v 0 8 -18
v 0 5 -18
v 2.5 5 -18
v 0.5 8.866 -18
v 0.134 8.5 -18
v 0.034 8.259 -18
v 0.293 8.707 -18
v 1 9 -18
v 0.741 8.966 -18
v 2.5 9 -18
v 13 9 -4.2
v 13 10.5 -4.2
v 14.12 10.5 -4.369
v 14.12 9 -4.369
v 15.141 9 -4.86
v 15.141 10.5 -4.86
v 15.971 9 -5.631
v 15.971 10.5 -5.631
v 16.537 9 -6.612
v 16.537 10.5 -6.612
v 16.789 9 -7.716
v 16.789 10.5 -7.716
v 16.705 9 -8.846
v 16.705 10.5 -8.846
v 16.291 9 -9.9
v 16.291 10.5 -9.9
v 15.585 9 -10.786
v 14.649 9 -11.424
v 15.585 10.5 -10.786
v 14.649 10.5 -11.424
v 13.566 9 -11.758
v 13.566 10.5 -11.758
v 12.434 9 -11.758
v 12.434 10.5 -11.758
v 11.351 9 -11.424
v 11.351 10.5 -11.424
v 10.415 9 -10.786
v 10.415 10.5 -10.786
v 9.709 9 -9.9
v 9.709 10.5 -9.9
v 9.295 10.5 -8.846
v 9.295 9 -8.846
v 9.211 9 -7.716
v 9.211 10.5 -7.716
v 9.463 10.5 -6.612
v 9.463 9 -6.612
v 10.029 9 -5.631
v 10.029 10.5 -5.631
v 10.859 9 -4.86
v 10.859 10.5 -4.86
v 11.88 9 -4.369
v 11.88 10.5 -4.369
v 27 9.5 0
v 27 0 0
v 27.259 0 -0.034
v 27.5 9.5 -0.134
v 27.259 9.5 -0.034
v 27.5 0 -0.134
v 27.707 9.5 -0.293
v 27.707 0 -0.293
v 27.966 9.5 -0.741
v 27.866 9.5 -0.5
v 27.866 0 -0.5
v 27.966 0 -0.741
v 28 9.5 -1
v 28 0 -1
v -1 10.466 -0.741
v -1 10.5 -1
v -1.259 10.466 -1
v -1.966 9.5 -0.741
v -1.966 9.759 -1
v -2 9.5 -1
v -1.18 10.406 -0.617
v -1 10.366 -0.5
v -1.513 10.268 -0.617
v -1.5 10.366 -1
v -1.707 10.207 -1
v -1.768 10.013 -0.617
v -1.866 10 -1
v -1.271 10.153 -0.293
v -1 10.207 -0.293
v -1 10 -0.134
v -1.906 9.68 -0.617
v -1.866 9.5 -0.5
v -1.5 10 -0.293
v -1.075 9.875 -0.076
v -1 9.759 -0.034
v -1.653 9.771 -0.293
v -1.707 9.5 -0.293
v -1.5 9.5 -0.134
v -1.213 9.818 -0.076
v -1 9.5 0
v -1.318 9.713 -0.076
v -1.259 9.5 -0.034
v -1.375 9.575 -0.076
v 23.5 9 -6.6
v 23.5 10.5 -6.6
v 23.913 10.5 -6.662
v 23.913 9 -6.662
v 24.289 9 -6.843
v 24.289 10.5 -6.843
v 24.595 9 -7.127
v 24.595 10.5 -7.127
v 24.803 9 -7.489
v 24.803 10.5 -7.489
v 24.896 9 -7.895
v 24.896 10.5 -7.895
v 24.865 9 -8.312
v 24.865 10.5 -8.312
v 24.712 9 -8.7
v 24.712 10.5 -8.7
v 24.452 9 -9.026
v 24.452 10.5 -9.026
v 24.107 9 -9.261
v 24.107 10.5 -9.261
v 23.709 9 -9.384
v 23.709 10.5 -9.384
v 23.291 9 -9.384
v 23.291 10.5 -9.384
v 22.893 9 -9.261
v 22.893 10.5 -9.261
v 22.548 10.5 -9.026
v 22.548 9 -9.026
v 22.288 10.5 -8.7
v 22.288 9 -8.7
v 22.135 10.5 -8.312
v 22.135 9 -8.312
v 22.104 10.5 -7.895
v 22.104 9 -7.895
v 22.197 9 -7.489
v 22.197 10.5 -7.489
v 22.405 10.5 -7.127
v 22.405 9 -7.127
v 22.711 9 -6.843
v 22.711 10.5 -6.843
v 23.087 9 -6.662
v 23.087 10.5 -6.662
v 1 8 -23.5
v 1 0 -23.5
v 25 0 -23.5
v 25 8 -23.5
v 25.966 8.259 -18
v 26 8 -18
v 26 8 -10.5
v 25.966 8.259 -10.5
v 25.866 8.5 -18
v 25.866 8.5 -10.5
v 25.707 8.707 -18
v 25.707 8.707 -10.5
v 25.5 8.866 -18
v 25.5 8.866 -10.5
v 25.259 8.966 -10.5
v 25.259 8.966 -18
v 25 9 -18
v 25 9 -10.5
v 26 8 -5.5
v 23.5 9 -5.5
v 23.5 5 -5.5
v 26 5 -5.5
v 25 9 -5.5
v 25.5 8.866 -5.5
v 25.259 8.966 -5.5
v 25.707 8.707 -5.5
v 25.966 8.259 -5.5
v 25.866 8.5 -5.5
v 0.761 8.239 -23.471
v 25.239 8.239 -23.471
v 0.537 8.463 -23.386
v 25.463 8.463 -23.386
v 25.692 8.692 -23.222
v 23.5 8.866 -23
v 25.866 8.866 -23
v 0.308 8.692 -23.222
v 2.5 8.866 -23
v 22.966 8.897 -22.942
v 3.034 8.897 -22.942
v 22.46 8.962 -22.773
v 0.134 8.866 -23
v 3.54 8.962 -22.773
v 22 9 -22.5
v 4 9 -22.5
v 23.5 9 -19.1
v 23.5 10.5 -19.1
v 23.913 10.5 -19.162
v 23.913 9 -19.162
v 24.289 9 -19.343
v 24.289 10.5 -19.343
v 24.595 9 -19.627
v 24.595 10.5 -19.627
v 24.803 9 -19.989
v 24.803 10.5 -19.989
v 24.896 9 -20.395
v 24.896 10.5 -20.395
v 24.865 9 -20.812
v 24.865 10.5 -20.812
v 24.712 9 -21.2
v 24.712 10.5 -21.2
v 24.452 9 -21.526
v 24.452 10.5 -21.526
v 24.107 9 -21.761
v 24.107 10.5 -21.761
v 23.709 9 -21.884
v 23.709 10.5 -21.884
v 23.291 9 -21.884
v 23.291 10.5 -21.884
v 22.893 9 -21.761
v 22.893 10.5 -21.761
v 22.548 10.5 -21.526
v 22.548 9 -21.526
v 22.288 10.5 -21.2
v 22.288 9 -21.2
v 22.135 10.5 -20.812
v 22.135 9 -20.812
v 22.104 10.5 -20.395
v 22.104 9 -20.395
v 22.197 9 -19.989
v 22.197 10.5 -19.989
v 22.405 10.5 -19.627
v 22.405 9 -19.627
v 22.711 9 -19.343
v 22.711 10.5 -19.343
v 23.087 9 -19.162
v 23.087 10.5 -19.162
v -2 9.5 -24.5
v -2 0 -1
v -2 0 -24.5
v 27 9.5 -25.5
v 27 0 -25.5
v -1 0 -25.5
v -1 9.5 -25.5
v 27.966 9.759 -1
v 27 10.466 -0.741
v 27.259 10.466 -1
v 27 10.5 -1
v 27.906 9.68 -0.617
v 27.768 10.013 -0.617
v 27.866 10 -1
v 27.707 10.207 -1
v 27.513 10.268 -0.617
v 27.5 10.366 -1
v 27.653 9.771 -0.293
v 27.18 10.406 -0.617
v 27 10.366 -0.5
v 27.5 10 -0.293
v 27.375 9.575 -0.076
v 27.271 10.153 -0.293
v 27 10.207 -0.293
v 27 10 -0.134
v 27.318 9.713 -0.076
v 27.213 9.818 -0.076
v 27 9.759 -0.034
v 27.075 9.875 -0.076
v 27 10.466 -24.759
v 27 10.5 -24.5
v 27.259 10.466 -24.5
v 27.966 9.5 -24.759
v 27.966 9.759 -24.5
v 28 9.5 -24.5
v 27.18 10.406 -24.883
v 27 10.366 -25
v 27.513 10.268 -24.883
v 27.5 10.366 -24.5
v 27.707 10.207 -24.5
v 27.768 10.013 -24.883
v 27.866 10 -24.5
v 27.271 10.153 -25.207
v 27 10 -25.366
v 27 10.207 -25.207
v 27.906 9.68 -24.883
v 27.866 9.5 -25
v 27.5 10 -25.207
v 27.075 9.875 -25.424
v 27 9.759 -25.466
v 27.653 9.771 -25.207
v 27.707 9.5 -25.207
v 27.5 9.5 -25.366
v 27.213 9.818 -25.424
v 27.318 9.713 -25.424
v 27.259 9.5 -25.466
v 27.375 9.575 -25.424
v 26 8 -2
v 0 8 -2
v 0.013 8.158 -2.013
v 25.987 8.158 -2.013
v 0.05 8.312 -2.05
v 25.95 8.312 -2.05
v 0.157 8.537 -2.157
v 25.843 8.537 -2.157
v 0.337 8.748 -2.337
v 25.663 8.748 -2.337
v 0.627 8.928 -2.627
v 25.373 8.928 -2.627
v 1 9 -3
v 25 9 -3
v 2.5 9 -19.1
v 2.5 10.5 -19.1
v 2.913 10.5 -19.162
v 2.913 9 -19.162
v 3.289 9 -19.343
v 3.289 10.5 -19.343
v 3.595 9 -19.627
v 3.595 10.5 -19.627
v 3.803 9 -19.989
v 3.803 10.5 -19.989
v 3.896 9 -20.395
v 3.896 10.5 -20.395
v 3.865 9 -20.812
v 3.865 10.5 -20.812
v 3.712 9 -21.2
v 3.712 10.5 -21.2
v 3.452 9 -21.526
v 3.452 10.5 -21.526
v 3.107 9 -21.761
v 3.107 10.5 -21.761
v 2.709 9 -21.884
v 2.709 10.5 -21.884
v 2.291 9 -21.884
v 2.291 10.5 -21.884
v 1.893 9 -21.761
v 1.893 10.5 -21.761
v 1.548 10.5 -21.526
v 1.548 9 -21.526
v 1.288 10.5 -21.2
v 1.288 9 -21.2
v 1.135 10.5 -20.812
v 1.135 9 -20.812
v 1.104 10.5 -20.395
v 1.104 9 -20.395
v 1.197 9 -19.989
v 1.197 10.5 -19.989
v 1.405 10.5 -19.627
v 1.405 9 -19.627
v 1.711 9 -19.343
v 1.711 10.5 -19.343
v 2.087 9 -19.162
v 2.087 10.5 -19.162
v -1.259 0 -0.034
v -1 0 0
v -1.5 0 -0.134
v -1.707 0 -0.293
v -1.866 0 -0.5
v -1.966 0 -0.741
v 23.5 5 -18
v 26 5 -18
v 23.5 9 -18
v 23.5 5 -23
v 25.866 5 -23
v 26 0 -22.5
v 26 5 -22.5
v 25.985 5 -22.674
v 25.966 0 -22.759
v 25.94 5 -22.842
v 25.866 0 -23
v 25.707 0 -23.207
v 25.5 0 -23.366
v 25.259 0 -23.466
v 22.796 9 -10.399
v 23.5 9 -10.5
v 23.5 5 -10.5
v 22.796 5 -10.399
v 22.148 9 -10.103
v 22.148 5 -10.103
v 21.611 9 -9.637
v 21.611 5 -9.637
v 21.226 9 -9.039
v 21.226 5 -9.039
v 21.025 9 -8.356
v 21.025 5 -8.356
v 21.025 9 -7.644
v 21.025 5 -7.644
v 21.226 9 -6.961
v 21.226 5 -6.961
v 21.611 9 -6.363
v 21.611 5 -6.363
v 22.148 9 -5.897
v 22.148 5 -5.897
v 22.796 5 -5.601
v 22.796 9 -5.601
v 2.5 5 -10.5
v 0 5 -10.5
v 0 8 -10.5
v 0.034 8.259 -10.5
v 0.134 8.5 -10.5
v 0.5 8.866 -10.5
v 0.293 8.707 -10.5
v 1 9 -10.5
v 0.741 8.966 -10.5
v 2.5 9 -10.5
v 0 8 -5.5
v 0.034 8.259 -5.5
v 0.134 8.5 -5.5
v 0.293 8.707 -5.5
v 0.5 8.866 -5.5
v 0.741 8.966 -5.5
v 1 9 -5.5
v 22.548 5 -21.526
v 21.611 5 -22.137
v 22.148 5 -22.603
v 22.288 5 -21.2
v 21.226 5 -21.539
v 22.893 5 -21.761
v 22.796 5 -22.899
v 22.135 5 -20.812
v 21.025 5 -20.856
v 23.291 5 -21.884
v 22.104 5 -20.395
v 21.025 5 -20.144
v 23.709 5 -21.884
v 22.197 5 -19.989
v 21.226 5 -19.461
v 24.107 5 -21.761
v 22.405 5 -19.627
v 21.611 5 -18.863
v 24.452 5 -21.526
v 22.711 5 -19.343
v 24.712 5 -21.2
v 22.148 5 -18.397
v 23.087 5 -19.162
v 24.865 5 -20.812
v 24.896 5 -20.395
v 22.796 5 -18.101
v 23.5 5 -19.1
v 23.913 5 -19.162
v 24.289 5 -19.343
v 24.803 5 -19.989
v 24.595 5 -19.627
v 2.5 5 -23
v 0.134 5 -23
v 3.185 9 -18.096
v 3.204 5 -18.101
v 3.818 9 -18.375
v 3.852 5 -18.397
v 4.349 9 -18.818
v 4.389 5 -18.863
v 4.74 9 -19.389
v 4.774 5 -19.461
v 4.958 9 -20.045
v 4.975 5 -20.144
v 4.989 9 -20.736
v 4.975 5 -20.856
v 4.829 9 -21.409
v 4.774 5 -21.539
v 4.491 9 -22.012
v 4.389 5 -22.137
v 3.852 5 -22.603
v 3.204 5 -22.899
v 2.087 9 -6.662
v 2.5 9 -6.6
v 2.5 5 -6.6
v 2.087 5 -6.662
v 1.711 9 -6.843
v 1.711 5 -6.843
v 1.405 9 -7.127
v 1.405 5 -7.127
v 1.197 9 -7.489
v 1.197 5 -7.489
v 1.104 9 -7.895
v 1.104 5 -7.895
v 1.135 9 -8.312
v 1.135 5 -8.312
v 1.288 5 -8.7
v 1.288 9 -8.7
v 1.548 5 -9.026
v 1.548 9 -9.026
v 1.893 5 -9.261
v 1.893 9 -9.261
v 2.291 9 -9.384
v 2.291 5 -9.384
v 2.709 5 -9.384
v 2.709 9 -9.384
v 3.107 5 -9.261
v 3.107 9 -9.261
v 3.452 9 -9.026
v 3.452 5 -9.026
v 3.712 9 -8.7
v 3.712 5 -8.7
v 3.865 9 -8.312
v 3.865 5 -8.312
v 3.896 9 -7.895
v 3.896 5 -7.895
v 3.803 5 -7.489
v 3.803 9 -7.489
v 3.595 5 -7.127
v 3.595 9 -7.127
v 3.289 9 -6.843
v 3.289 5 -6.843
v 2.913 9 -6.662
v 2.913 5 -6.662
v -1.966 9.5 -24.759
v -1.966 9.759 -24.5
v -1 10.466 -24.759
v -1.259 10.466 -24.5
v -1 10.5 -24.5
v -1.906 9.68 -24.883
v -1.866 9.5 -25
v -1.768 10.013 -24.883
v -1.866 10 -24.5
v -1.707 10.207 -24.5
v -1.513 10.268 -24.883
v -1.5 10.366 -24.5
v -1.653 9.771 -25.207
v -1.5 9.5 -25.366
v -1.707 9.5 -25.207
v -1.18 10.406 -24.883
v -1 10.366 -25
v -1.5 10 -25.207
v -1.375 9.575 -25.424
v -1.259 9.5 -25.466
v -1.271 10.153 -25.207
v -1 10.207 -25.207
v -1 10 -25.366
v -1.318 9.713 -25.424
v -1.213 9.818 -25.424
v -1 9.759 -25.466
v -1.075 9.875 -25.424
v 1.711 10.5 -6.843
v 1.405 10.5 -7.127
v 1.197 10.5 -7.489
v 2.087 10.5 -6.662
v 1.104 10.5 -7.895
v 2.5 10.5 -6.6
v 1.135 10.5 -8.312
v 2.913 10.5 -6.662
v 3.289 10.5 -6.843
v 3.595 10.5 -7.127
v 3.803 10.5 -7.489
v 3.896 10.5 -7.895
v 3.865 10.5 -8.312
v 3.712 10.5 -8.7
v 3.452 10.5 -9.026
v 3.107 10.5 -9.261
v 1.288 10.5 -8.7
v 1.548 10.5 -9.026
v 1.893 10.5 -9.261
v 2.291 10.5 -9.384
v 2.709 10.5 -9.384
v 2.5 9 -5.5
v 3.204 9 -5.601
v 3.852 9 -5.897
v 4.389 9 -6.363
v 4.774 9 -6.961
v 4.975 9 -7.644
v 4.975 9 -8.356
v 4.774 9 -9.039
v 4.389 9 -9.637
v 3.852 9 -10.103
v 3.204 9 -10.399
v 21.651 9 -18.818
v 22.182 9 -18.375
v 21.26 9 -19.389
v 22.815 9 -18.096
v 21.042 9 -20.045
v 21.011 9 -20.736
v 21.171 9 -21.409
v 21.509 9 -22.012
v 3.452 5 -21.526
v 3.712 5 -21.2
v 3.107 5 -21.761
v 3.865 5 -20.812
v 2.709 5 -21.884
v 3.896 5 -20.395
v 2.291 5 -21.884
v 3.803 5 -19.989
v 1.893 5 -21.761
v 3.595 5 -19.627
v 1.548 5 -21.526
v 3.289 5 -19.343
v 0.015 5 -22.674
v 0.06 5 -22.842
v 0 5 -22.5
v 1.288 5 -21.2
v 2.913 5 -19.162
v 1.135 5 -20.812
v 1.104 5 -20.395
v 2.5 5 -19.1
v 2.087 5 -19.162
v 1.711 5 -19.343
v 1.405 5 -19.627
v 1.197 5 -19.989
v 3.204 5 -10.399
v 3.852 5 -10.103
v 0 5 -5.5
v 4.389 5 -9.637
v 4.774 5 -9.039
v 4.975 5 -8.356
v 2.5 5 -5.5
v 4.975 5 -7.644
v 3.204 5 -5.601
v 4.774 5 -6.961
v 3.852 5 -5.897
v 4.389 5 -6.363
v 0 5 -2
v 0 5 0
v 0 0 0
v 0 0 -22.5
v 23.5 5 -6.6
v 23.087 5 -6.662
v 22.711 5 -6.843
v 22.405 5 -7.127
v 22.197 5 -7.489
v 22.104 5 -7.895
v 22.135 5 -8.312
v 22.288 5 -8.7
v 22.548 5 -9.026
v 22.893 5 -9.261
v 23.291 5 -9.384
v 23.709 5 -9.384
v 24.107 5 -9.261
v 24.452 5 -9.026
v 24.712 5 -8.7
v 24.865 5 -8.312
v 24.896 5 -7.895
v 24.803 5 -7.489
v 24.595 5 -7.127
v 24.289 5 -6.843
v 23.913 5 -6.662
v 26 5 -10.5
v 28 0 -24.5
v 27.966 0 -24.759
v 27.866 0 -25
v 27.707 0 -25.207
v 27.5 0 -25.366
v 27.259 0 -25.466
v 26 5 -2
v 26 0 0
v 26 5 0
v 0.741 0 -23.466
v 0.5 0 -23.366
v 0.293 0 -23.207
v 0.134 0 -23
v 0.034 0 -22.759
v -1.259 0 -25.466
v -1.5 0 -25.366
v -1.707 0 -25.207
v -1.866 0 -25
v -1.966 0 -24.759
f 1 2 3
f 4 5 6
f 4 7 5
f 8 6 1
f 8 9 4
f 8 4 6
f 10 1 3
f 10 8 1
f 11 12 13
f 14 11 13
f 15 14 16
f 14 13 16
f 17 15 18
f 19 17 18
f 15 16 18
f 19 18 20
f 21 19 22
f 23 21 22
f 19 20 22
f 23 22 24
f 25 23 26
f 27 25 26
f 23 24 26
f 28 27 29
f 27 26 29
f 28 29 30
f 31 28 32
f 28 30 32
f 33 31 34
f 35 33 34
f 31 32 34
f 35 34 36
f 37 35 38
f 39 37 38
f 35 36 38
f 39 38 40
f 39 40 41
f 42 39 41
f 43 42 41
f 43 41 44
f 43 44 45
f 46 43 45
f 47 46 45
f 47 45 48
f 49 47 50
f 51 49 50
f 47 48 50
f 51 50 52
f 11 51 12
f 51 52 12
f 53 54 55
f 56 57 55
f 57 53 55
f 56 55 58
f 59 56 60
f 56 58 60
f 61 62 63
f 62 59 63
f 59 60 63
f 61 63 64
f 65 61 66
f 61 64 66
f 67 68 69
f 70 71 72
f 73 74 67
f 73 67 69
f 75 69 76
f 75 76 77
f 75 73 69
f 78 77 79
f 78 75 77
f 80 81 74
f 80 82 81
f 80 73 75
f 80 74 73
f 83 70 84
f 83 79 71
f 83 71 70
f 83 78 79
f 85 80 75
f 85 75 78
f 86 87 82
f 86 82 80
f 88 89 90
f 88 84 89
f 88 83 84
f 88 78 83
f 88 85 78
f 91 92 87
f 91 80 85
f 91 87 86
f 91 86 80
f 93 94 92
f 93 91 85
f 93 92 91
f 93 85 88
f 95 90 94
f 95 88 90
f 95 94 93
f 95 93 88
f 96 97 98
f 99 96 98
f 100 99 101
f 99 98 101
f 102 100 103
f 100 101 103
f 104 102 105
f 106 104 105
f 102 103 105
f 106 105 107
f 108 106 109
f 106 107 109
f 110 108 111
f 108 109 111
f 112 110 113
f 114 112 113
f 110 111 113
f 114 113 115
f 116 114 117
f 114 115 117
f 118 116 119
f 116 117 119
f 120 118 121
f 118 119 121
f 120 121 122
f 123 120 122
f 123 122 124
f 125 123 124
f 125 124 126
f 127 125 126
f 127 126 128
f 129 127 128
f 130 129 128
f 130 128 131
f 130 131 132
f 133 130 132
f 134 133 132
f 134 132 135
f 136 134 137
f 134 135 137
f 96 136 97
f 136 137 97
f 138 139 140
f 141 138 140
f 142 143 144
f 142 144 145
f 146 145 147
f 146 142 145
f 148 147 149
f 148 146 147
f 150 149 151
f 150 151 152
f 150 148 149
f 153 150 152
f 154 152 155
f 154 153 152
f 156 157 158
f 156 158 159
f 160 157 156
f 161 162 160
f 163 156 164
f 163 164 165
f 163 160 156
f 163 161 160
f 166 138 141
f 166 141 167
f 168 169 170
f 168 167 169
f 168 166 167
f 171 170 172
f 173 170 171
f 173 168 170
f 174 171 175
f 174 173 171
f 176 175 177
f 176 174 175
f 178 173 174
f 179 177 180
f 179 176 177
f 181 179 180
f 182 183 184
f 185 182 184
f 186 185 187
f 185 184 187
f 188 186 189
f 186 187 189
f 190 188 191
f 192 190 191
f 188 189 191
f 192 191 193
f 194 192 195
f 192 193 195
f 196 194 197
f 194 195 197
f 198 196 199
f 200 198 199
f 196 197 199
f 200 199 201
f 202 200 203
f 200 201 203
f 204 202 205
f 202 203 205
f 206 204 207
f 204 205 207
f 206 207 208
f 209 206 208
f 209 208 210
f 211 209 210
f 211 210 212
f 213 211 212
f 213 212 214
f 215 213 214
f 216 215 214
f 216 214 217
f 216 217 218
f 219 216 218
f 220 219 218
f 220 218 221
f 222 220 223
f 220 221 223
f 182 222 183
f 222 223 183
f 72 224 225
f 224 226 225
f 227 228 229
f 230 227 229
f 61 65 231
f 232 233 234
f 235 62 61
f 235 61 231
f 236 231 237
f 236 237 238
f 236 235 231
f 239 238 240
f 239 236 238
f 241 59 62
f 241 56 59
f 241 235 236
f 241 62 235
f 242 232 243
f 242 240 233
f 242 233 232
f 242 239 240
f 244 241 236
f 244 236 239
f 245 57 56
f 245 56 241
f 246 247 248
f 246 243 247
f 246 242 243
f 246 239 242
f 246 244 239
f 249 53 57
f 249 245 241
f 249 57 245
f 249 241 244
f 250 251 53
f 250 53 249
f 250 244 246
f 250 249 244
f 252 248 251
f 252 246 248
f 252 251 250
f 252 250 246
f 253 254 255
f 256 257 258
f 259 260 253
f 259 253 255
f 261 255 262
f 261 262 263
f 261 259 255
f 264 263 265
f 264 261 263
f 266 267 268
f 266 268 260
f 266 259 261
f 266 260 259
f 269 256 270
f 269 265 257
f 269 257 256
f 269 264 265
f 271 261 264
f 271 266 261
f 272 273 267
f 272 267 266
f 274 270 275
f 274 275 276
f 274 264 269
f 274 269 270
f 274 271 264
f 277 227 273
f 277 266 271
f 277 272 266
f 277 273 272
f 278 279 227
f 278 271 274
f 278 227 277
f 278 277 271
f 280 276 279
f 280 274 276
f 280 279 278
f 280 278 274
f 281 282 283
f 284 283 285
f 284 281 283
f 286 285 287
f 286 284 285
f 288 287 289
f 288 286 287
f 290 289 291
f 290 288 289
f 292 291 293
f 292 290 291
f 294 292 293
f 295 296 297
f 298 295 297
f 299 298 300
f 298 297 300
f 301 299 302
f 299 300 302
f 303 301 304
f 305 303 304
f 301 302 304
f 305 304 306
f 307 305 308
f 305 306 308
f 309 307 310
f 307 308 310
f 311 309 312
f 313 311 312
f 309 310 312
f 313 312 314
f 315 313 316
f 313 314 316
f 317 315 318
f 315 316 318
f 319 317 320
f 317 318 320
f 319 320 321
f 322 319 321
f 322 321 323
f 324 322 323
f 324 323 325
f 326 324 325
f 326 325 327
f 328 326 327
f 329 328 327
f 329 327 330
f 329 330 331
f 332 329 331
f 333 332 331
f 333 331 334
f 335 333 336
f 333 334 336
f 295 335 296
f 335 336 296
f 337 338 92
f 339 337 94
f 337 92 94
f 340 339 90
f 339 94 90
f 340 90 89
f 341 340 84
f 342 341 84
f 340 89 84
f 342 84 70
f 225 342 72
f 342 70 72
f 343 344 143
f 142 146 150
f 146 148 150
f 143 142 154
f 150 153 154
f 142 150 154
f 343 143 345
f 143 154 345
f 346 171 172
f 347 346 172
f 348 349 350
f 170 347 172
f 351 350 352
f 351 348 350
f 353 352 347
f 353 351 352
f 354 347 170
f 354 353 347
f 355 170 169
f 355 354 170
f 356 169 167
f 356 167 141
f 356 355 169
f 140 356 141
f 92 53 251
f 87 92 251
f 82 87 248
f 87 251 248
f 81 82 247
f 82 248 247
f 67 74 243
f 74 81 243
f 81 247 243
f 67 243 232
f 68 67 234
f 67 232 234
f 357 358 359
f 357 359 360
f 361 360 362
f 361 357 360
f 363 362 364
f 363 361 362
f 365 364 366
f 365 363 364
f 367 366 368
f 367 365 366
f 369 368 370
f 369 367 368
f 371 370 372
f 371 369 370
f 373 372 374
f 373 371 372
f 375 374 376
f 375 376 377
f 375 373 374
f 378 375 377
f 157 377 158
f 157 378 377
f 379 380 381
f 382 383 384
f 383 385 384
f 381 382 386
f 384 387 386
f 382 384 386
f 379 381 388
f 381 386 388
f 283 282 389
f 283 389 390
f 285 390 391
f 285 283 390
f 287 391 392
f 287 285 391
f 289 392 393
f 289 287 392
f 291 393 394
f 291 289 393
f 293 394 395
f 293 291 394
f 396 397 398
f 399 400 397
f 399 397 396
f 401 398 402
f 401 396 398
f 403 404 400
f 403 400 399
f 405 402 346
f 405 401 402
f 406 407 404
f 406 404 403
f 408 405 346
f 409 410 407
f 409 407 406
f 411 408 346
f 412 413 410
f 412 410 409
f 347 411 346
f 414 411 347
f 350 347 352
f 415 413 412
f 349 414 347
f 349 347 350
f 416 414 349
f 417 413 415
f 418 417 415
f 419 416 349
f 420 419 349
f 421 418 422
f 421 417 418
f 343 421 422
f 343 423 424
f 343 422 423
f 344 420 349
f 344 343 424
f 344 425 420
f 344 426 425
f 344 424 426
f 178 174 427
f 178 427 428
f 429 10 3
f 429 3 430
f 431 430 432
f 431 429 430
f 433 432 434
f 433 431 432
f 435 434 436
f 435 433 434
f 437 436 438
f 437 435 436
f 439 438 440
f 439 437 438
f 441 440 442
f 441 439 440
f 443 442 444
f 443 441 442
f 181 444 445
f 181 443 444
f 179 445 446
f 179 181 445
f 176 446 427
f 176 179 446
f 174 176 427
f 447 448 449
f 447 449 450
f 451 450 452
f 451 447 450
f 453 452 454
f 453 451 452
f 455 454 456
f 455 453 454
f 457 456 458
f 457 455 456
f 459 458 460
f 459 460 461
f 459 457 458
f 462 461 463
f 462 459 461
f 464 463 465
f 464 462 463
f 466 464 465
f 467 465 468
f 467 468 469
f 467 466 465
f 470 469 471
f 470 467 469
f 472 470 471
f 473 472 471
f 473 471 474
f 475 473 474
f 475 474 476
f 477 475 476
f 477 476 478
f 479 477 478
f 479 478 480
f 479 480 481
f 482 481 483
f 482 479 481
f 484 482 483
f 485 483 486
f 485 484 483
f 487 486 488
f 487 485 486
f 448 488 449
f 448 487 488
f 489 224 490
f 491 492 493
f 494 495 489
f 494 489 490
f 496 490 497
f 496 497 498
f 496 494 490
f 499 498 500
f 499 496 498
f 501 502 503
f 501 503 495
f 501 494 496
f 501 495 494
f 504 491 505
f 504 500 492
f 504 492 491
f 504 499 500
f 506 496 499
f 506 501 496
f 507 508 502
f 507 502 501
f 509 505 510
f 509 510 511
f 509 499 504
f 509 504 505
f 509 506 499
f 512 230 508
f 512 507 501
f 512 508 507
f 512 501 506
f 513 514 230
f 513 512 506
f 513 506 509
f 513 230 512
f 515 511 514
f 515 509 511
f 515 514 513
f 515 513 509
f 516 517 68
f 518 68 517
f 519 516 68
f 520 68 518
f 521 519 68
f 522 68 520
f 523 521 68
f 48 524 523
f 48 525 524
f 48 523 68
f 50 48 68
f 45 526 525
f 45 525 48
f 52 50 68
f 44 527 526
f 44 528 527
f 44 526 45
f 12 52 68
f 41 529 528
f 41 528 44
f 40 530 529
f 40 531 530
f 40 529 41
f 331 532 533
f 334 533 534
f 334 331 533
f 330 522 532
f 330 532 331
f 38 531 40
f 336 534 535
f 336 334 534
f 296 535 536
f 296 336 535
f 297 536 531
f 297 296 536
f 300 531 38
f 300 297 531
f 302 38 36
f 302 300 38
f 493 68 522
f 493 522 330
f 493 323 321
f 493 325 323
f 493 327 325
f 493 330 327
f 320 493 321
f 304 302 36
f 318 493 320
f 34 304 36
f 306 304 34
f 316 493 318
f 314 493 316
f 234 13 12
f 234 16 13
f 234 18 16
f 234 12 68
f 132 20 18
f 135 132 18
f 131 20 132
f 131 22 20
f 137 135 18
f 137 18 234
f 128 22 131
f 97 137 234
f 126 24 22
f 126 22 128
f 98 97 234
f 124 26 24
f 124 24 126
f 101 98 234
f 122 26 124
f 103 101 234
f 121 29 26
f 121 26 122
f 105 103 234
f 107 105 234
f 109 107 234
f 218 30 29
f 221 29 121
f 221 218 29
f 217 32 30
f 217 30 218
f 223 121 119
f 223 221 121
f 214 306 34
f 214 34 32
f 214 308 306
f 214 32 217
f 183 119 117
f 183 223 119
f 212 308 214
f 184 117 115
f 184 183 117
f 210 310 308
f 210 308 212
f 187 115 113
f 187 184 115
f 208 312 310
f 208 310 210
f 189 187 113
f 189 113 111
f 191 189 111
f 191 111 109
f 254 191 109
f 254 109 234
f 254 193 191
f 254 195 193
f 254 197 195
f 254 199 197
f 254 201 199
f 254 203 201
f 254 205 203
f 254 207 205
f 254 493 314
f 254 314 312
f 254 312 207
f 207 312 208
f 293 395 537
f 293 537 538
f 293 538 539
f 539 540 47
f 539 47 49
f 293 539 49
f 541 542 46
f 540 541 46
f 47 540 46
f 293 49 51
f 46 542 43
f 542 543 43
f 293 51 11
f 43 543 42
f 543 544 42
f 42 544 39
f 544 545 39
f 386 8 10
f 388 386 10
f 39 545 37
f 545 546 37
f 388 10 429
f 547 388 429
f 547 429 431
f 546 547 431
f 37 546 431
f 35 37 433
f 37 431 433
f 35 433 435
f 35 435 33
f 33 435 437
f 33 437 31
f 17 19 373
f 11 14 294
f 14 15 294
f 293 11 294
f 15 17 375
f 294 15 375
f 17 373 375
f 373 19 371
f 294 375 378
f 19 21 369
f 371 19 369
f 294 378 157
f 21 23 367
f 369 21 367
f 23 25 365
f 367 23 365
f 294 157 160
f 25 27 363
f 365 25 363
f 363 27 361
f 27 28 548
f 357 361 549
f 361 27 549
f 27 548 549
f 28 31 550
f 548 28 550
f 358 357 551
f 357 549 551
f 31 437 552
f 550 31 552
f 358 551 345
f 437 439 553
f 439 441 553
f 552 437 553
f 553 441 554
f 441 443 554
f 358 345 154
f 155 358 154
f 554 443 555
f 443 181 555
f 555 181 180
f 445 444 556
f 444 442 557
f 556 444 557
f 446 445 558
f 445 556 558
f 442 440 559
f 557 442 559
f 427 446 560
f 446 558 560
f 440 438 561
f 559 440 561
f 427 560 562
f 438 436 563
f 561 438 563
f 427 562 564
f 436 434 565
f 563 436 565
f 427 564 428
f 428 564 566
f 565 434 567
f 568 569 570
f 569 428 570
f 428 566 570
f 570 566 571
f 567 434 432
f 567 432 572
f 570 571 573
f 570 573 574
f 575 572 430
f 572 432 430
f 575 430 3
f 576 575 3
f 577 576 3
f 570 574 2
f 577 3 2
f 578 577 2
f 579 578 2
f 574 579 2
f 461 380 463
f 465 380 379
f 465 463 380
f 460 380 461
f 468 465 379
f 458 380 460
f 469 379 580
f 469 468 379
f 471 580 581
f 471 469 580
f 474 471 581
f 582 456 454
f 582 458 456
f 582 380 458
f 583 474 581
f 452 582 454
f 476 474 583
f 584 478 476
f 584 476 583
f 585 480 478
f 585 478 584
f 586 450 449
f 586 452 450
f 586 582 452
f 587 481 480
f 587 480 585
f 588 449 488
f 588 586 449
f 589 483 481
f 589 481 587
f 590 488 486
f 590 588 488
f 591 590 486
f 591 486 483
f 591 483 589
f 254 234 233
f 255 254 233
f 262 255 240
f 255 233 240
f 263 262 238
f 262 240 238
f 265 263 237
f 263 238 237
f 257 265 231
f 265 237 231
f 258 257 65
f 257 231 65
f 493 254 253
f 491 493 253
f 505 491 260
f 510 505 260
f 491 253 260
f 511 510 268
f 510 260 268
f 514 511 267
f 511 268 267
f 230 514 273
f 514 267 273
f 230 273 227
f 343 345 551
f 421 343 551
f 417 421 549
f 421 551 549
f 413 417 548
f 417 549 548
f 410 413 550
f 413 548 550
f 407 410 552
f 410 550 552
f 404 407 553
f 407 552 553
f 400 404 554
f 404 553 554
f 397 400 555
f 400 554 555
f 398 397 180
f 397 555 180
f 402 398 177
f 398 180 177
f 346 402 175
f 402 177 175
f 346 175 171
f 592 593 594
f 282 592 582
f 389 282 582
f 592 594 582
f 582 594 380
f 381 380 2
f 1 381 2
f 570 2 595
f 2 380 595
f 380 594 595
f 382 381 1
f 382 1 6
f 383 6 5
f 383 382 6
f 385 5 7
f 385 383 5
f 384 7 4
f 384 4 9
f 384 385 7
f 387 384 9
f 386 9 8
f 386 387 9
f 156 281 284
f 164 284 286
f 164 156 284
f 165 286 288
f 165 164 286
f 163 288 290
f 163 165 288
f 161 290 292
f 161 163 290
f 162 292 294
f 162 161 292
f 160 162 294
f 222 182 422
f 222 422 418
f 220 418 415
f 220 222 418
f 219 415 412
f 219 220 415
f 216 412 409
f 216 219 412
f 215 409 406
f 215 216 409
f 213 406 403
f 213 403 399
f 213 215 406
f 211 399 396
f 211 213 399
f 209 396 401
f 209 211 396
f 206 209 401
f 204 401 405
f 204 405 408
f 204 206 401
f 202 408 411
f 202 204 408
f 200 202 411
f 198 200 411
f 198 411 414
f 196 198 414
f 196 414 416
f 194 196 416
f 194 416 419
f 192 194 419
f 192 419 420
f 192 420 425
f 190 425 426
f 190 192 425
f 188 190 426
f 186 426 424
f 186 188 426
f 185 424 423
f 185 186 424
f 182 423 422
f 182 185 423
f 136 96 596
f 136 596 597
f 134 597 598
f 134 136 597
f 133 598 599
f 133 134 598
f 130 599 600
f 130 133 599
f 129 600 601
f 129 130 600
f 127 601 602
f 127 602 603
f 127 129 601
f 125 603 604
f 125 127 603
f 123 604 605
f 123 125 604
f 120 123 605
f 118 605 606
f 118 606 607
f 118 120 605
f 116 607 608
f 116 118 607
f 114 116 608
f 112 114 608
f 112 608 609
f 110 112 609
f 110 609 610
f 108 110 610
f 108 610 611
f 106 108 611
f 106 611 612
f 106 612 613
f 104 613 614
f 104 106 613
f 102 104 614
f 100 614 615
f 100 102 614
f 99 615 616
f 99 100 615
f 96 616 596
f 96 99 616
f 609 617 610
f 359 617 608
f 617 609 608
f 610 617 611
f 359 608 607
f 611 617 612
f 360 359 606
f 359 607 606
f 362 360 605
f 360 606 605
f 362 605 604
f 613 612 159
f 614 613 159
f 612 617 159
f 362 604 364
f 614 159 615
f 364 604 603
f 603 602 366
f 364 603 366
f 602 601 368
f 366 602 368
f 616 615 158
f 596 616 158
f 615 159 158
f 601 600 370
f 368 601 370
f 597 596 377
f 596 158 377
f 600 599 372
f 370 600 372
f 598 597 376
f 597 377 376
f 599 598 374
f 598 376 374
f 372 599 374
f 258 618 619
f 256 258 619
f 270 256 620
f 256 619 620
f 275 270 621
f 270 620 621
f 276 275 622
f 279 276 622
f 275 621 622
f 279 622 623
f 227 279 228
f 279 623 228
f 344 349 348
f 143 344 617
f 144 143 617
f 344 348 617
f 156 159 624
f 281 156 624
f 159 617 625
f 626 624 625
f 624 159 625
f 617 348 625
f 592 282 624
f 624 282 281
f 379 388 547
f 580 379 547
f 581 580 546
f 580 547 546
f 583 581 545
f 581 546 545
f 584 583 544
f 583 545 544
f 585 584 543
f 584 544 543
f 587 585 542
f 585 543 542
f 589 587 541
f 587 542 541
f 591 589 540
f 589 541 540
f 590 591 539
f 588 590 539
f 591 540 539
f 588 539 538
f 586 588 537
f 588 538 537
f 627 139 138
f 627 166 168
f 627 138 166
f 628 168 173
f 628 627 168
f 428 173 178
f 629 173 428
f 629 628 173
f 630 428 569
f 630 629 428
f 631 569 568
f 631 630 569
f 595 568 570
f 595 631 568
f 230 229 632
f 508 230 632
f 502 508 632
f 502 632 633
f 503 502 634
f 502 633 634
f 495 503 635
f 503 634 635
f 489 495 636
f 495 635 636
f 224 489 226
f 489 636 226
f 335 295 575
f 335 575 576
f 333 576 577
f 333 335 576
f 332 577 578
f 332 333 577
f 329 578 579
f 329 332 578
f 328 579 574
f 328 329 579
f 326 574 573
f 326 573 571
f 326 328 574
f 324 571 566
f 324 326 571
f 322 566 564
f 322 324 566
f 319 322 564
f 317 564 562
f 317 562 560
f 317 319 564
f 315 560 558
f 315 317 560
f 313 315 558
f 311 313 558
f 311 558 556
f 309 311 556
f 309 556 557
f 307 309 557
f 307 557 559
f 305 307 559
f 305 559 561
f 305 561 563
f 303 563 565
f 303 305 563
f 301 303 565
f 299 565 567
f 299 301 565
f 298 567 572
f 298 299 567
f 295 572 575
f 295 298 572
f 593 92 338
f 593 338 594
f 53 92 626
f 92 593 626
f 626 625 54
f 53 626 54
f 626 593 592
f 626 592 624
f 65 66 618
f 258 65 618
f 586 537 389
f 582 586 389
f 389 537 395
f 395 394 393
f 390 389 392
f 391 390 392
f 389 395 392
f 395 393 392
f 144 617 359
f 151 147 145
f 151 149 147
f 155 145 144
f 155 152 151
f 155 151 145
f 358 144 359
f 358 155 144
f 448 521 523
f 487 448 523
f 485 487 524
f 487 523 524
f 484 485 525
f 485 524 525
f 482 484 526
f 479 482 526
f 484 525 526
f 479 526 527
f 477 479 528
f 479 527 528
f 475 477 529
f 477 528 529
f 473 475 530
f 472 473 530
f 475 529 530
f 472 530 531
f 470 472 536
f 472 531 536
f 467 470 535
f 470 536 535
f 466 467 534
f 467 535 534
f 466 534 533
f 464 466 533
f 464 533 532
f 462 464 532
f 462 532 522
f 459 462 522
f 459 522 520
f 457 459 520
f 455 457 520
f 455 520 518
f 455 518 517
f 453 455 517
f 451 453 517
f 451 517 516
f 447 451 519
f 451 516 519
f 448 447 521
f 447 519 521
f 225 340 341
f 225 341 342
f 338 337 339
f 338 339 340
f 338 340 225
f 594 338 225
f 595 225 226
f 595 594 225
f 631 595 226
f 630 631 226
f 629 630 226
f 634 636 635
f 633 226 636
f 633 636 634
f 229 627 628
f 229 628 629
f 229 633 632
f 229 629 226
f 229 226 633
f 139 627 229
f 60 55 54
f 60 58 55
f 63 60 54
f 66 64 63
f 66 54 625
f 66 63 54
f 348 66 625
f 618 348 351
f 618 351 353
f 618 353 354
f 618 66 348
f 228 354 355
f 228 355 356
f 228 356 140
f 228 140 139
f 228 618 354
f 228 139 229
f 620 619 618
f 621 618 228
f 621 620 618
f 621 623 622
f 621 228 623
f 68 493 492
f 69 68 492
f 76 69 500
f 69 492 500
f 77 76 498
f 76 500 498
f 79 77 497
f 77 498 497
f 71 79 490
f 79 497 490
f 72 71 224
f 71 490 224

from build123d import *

# Parameters (mm, degrees)
BOSS_EXTRUDE1_DEPTH = 10.5
SKETCH3_R           = 1.4
SKETCH3_R_2         = 3.8
BOSS_EXTRUDE2_DEPTH = 1.5
SKETCH4_W           = 26
SKETCH4_H           = 2
SKETCH4_R           = 1.4
BOSS_EXTRUDE3_DEPTH = 4
FILLET1_R           = 1


with BuildPart() as part:
    # Sketch1 → Boss-Extrude1 (new body)
    with BuildSketch(Plane(origin=(0, 0, 0), x_dir=(1, 0, 0), z_dir=(0, 1, 0))):
        Polygon((26, 0), (28, 0), (28, 25.5), (-2, 25.5), (-2, 0), (0, 0), (0, 23.5), (26, 23.5), align=None)
    extrude(amount=BOSS_EXTRUDE1_DEPTH)

    # Sketch3 → Boss-Extrude2 (add)
    with BuildSketch(Plane(origin=(0, 10.5, 0), x_dir=(1, 0, 0), z_dir=(0, 1, 0))):
        Polygon((0, 0), (26, 0), (28, 0), (28, 25.5), (-2, 25.5), (-2, 0), align=None)
        with Locations(Location((2.5, 20.5, 0), (0, 0, 270))):
            Circle(SKETCH3_R, mode=Mode.SUBTRACT)
        with Locations(Location((2.5, 8, 0), (0, 0, 270))):
            Circle(SKETCH3_R, mode=Mode.SUBTRACT)
        with Locations(Location((23.5, 8, 0), (0, 0, 270))):
            Circle(SKETCH3_R, mode=Mode.SUBTRACT)
        with Locations(Location((23.5, 20.5, 0), (0, 0, 270))):
            Circle(SKETCH3_R, mode=Mode.SUBTRACT)
        with Locations(Location((13, 8, 0), (0, 0, 270))):
            Circle(SKETCH3_R_2, mode=Mode.SUBTRACT)
    extrude(amount=-BOSS_EXTRUDE2_DEPTH)

    # Sketch4 → Boss-Extrude3 (add)
    # profile 1 of 5: a face of its own
    with BuildSketch(Plane.XZ.offset(-9)):
        with Locations((13, -1)):
            Rectangle(SKETCH4_W, SKETCH4_H)
    # profile 2 of 5: a face of its own
    with BuildSketch(Plane.XZ.offset(-9)):
        with BuildLine():
            Line((2.5, -5.5), (0, -5.5))
            Line((0, -5.5), (0, -10.5))
            Line((0, -10.5), (2.5, -10.5))
            ThreePointArc((2.5, -10.5), (5, -8), (2.5, -5.5))
        make_face()
        with Locations(Location((2.5, -8, 0), (0, 0, 90))):
            Circle(SKETCH4_R, mode=Mode.SUBTRACT)
    # profile 3 of 5: a face of its own
    with BuildSketch(Plane.XZ.offset(-9)):
        with BuildLine():
            Line((2.5, -23), (0, -23))
            Line((0, -23), (0, -18))
            Line((0, -18), (2.5, -18))
            ThreePointArc((2.5, -18), (5, -20.5), (2.5, -23))
        make_face()
        with Locations(Location((2.5, -20.5, 0), (0, 0, 90))):
            Circle(SKETCH4_R, mode=Mode.SUBTRACT)
    # profile 4 of 5: a face of its own
    with BuildSketch(Plane.XZ.offset(-9)):
        with BuildLine():
            Line((26, -23), (26, -18))
            Line((26, -18), (23.5, -18))
            ThreePointArc((23.5, -18), (21, -20.5), (23.5, -23))
            Line((23.5, -23), (26, -23))
        make_face()
        with Locations(Location((23.5, -20.5, 0), (0, 0, 90))):
            Circle(SKETCH4_R, mode=Mode.SUBTRACT)
    # profile 5 of 5: a face of its own
    with BuildSketch(Plane.XZ.offset(-9)):
        with BuildLine():
            Line((23.5, -5.5), (26, -5.5))
            Line((26, -5.5), (26, -10.5))
            Line((26, -10.5), (23.5, -10.5))
            ThreePointArc((23.5, -10.5), (21, -8), (23.5, -5.5))
        make_face()
        with Locations(Location((23.5, -8, 0), (0, 0, 90))):
            Circle(SKETCH4_R, mode=Mode.SUBTRACT)
    extrude(amount=BOSS_EXTRUDE3_DEPTH)

    # Fillet1
    # the kernel refuses this fillet: 1 mm, written as the material it adds along each edge
    with BuildSketch(Plane(origin=(0, 9, -23.5), x_dir=(0, -1, 0), z_dir=(1, 0, 0)), Plane(origin=(26, 9, -2), x_dir=(0, -1, 0), z_dir=(-1, 0, 0))) as fillet1_piece_1:
        with BuildLine():
            CenterArc((FILLET1_R, -FILLET1_R), FILLET1_R, 90, 90)
            Line((0, -FILLET1_R), (-FILLET1_R * 0.02, -FILLET1_R))
            Line((-FILLET1_R * 0.02, -FILLET1_R), (-FILLET1_R * 0.02, FILLET1_R * 0.02))
            Line((-FILLET1_R * 0.02, FILLET1_R * 0.02), (FILLET1_R, FILLET1_R * 0.02))
            Line((FILLET1_R, FILLET1_R * 0.02), (FILLET1_R, 0))
        make_face()
    extrude(amount=26)
    with BuildSketch(Plane(origin=(26, 9, -5.5), x_dir=(0, -1, 0), z_dir=(0, 0, 1)), Plane(origin=(0, 9, -2), x_dir=(0, -1, 0), z_dir=(0, 0, -1))) as fillet1_piece_2:
        with BuildLine():
            CenterArc((FILLET1_R, -FILLET1_R), FILLET1_R, 90, 90)
            Line((0, -FILLET1_R), (-FILLET1_R * 0.02, -FILLET1_R))
            Line((-FILLET1_R * 0.02, -FILLET1_R), (-FILLET1_R * 0.02, FILLET1_R * 0.02))
            Line((-FILLET1_R * 0.02, FILLET1_R * 0.02), (FILLET1_R, FILLET1_R * 0.02))
            Line((FILLET1_R, FILLET1_R * 0.02), (FILLET1_R, 0))
        make_face()
    extrude(amount=3.5)
    with BuildSketch(Plane(origin=(26, 9, -18), x_dir=(0, -1, 0), z_dir=(0, 0, 1)), Plane(origin=(0, 9, -10.5), x_dir=(0, -1, 0), z_dir=(0, 0, -1))) as fillet1_piece_3:
        with BuildLine():
            CenterArc((FILLET1_R, -FILLET1_R), FILLET1_R, 90, 90)
            Line((0, -FILLET1_R), (-FILLET1_R * 0.02, -FILLET1_R))
            Line((-FILLET1_R * 0.02, -FILLET1_R), (-FILLET1_R * 0.02, FILLET1_R * 0.02))
            Line((-FILLET1_R * 0.02, FILLET1_R * 0.02), (FILLET1_R, FILLET1_R * 0.02))
            Line((FILLET1_R, FILLET1_R * 0.02), (FILLET1_R, 0))
        make_face()
    extrude(amount=7.5)
    with BuildSketch(Plane(origin=(0, 0, -23.5), x_dir=(0, 0, 1), z_dir=(0, 1, 0))) as fillet1_piece_4:
        with BuildLine():
            CenterArc((FILLET1_R, FILLET1_R), FILLET1_R, 180, 90)
            Line((0, FILLET1_R), (-FILLET1_R * 0.02, FILLET1_R))
            Line((-FILLET1_R * 0.02, FILLET1_R), (-FILLET1_R * 0.02, -FILLET1_R * 0.02))
            Line((-FILLET1_R * 0.02, -FILLET1_R * 0.02), (FILLET1_R, -FILLET1_R * 0.02))
            Line((FILLET1_R, -FILLET1_R * 0.02), (FILLET1_R, 0))
        make_face()
    extrude(amount=9)
    with BuildSketch(Plane(origin=(26, 0, -23.5), x_dir=(0, 0, 1), z_dir=(0, 1, 0))) as fillet1_piece_5:
        with BuildLine():
            CenterArc((FILLET1_R, -FILLET1_R), FILLET1_R, 90, 90)
            Line((0, -FILLET1_R), (-FILLET1_R * 0.02, -FILLET1_R))
            Line((-FILLET1_R * 0.02, -FILLET1_R), (-FILLET1_R * 0.02, FILLET1_R * 0.02))
            Line((-FILLET1_R * 0.02, FILLET1_R * 0.02), (FILLET1_R, FILLET1_R * 0.02))
            Line((FILLET1_R, FILLET1_R * 0.02), (FILLET1_R, 0))
        make_face()
    extrude(amount=9)
    with BuildSketch(Plane(origin=(0, 0, -23.5), x_dir=(0, 0, 1), z_dir=(0, 1, 0))) as fillet1_piece_6a_section:
        with BuildLine():
            CenterArc((FILLET1_R, FILLET1_R), FILLET1_R, 180, 90)
            Line((0, FILLET1_R), (-FILLET1_R * 0.02, FILLET1_R))
            Line((-FILLET1_R * 0.02, FILLET1_R), (-FILLET1_R * 0.02, -FILLET1_R * 0.02))
            Line((-FILLET1_R * 0.02, -FILLET1_R * 0.02), (FILLET1_R, -FILLET1_R * 0.02))
            Line((FILLET1_R, -FILLET1_R * 0.02), (FILLET1_R, 0))
        make_face()
    fillet1_piece_6a = extrude(amount=11.5, mode=Mode.PRIVATE)
    fillet1_piece_6a = split(fillet1_piece_6a, bisect_by=Plane(origin=(0.226395114, 9, -23.273604886), z_dir=(0, 1, 0)), keep=Keep.TOP, mode=Mode.PRIVATE)
    with BuildSketch(Plane(origin=(-2.5, 9, -23.5), x_dir=(0, -1, 0), z_dir=(1, 0, 0))) as fillet1_piece_6b_section:
        with BuildLine():
            CenterArc((FILLET1_R, -FILLET1_R), FILLET1_R, 90, 90)
            Line((0, -FILLET1_R), (-FILLET1_R * 0.02, -FILLET1_R))
            Line((-FILLET1_R * 0.02, -FILLET1_R), (-FILLET1_R * 0.02, FILLET1_R * 0.02))
            Line((-FILLET1_R * 0.02, FILLET1_R * 0.02), (FILLET1_R, FILLET1_R * 0.02))
            Line((FILLET1_R, FILLET1_R * 0.02), (FILLET1_R, 0))
        make_face()
    fillet1_piece_6b = extrude(amount=28.5, mode=Mode.PRIVATE)
    fillet1_piece_6b = split(fillet1_piece_6b, bisect_by=Plane(origin=(0, 8.773604886, -23.273604886), z_dir=(-1, 0, 0)), keep=Keep.TOP, mode=Mode.PRIVATE)
    fillet1_piece_6 = fillet1_piece_6a & fillet1_piece_6b
    add(fillet1_piece_6)
    with BuildSketch(Plane(origin=(26, 0, -23.5), x_dir=(0, 0, 1), z_dir=(0, 1, 0))) as fillet1_piece_7a_section:
        with BuildLine():
            CenterArc((FILLET1_R, -FILLET1_R), FILLET1_R, 90, 90)
            Line((0, -FILLET1_R), (-FILLET1_R * 0.02, -FILLET1_R))
            Line((-FILLET1_R * 0.02, -FILLET1_R), (-FILLET1_R * 0.02, FILLET1_R * 0.02))
            Line((-FILLET1_R * 0.02, FILLET1_R * 0.02), (FILLET1_R, FILLET1_R * 0.02))
            Line((FILLET1_R, FILLET1_R * 0.02), (FILLET1_R, 0))
        make_face()
    fillet1_piece_7a = extrude(amount=11.5, mode=Mode.PRIVATE)
    fillet1_piece_7a = split(fillet1_piece_7a, bisect_by=Plane(origin=(25.773604886, 9, -23.273604886), z_dir=(0, 1, 0)), keep=Keep.TOP, mode=Mode.PRIVATE)
    with BuildSketch(Plane(origin=(0, 9, -23.5), x_dir=(0, -1, 0), z_dir=(1, 0, 0))) as fillet1_piece_7b_section:
        with BuildLine():
            CenterArc((FILLET1_R, -FILLET1_R), FILLET1_R, 90, 90)
            Line((0, -FILLET1_R), (-FILLET1_R * 0.02, -FILLET1_R))
            Line((-FILLET1_R * 0.02, -FILLET1_R), (-FILLET1_R * 0.02, FILLET1_R * 0.02))
            Line((-FILLET1_R * 0.02, FILLET1_R * 0.02), (FILLET1_R, FILLET1_R * 0.02))
            Line((FILLET1_R, FILLET1_R * 0.02), (FILLET1_R, 0))
        make_face()
    fillet1_piece_7b = extrude(amount=28.5, mode=Mode.PRIVATE)
    fillet1_piece_7b = split(fillet1_piece_7b, bisect_by=Plane(origin=(26, 8.773604886, -23.273604886), z_dir=(1, 0, 0)), keep=Keep.TOP, mode=Mode.PRIVATE)
    fillet1_piece_7 = fillet1_piece_7a & fillet1_piece_7b
    add(fillet1_piece_7)
    with BuildSketch(Plane(origin=(26, 9, -5.5), x_dir=(0, -1, 0), z_dir=(0, 0, 1))) as fillet1_piece_8a_section:
        with BuildLine():
            CenterArc((FILLET1_R, -FILLET1_R), FILLET1_R, 90, 90)
            Line((0, -FILLET1_R), (-FILLET1_R * 0.02, -FILLET1_R))
            Line((-FILLET1_R * 0.02, -FILLET1_R), (-FILLET1_R * 0.02, FILLET1_R * 0.02))
            Line((-FILLET1_R * 0.02, FILLET1_R * 0.02), (FILLET1_R, FILLET1_R * 0.02))
            Line((FILLET1_R, FILLET1_R * 0.02), (FILLET1_R, 0))
        make_face()
    fillet1_piece_8a = extrude(amount=6, mode=Mode.PRIVATE)
    fillet1_piece_8a = split(fillet1_piece_8a, bisect_by=Plane(origin=(25.773604886, 8.773604886, -2), z_dir=(0, 0, 1)), keep=Keep.TOP, mode=Mode.PRIVATE)
    with BuildSketch(Plane(origin=(28.5, 9, -2), x_dir=(0, -1, 0), z_dir=(-1, 0, 0))) as fillet1_piece_8b_section:
        with BuildLine():
            CenterArc((FILLET1_R, -FILLET1_R), FILLET1_R, 90, 90)
            Line((0, -FILLET1_R), (-FILLET1_R * 0.02, -FILLET1_R))
            Line((-FILLET1_R * 0.02, -FILLET1_R), (-FILLET1_R * 0.02, FILLET1_R * 0.02))
            Line((-FILLET1_R * 0.02, FILLET1_R * 0.02), (FILLET1_R, FILLET1_R * 0.02))
            Line((FILLET1_R, FILLET1_R * 0.02), (FILLET1_R, 0))
        make_face()
    fillet1_piece_8b = extrude(amount=28.5, mode=Mode.PRIVATE)
    fillet1_piece_8b = split(fillet1_piece_8b, bisect_by=Plane(origin=(26, 8.773604886, -2.226395114), z_dir=(1, 0, 0)), keep=Keep.TOP, mode=Mode.PRIVATE)
    fillet1_piece_8 = fillet1_piece_8a & fillet1_piece_8b
    add(fillet1_piece_8)
    with BuildSketch(Plane(origin=(0, 9, 0.5), x_dir=(0, -1, 0), z_dir=(0, 0, -1))) as fillet1_piece_9a_section:
        with BuildLine():
            CenterArc((FILLET1_R, -FILLET1_R), FILLET1_R, 90, 90)
            Line((0, -FILLET1_R), (-FILLET1_R * 0.02, -FILLET1_R))
            Line((-FILLET1_R * 0.02, -FILLET1_R), (-FILLET1_R * 0.02, FILLET1_R * 0.02))
            Line((-FILLET1_R * 0.02, FILLET1_R * 0.02), (FILLET1_R, FILLET1_R * 0.02))
            Line((FILLET1_R, FILLET1_R * 0.02), (FILLET1_R, 0))
        make_face()
    fillet1_piece_9a = extrude(amount=6, mode=Mode.PRIVATE)
    fillet1_piece_9a = split(fillet1_piece_9a, bisect_by=Plane(origin=(0.226395114, 8.773604886, -2), z_dir=(0, 0, 1)), keep=Keep.TOP, mode=Mode.PRIVATE)
    with BuildSketch(Plane(origin=(26, 9, -2), x_dir=(0, -1, 0), z_dir=(-1, 0, 0))) as fillet1_piece_9b_section:
        with BuildLine():
            CenterArc((FILLET1_R, -FILLET1_R), FILLET1_R, 90, 90)
            Line((0, -FILLET1_R), (-FILLET1_R * 0.02, -FILLET1_R))
            Line((-FILLET1_R * 0.02, -FILLET1_R), (-FILLET1_R * 0.02, FILLET1_R * 0.02))
            Line((-FILLET1_R * 0.02, FILLET1_R * 0.02), (FILLET1_R, FILLET1_R * 0.02))
            Line((FILLET1_R, FILLET1_R * 0.02), (FILLET1_R, 0))
        make_face()
    fillet1_piece_9b = extrude(amount=28.5, mode=Mode.PRIVATE)
    fillet1_piece_9b = split(fillet1_piece_9b, bisect_by=Plane(origin=(0, 8.773604886, -2.226395114), z_dir=(-1, 0, 0)), keep=Keep.TOP, mode=Mode.PRIVATE)
    fillet1_piece_9 = fillet1_piece_9a & fillet1_piece_9b
    add(fillet1_piece_9)
    # the kernel refuses this fillet: 1 mm, written as the material it takes off along each edge
    with BuildSketch(Plane(origin=(27, 9.5, -1), x_dir=(0, 1, 0), z_dir=(0, 0, 1))) as fillet1_2_piece_1_section:
        Polygon((0, 0), (FILLET1_R * 1.02, 0), (FILLET1_R * 1.02, -FILLET1_R * 1.02), (0, -FILLET1_R * 1.02), align=None)
    fillet1_2_piece_1 = extrude(amount=FILLET1_R * 1.02, mode=Mode.PRIVATE)
    fillet1_2_piece_1 = fillet1_2_piece_1 - Plane(origin=(27, 9.5, -1), x_dir=(-0.7071067811865475, -0.7071067811865475, 0), z_dir=(0, 0, 1)) * Sphere(FILLET1_R, mode=Mode.PRIVATE)
    add(fillet1_2_piece_1, mode=Mode.SUBTRACT)
    with BuildSketch(Plane(origin=(-1, 9.5, -1), x_dir=(-1, 0, 0), z_dir=(0, 0, 1))) as fillet1_2_piece_2_section:
        Polygon((0, 0), (FILLET1_R * 1.02, 0), (FILLET1_R * 1.02, -FILLET1_R * 1.02), (0, -FILLET1_R * 1.02), align=None)
    fillet1_2_piece_2 = extrude(amount=FILLET1_R * 1.02, mode=Mode.PRIVATE)
    fillet1_2_piece_2 = fillet1_2_piece_2 - Plane(origin=(-1, 9.5, -1), x_dir=(0.7071067811865475, -0.7071067811865475, 0), z_dir=(0, 0, 1)) * Sphere(FILLET1_R, mode=Mode.PRIVATE)
    add(fillet1_2_piece_2, mode=Mode.SUBTRACT)
    with BuildSketch(Plane(origin=(27, 9.5, -24.5), x_dir=(0, 1, 0), z_dir=(0, 0, -1))) as fillet1_2_piece_3_section:
        Polygon((0, 0), (FILLET1_R * 1.02, 0), (FILLET1_R * 1.02, FILLET1_R * 1.02), (0, FILLET1_R * 1.02), align=None)
    fillet1_2_piece_3 = extrude(amount=FILLET1_R * 1.02, mode=Mode.PRIVATE)
    fillet1_2_piece_3 = fillet1_2_piece_3 - Plane(origin=(27, 9.5, -24.5), x_dir=(-0.7071067811865475, -0.7071067811865475, 0), z_dir=(0, 0, -1)) * Sphere(FILLET1_R, mode=Mode.PRIVATE)
    add(fillet1_2_piece_3, mode=Mode.SUBTRACT)
    with BuildSketch(Plane(origin=(-1, 9.5, -24.5), x_dir=(-1, 0, 0), z_dir=(0, 0, -1))) as fillet1_2_piece_4_section:
        Polygon((0, 0), (FILLET1_R * 1.02, 0), (FILLET1_R * 1.02, FILLET1_R * 1.02), (0, FILLET1_R * 1.02), align=None)
    fillet1_2_piece_4 = extrude(amount=FILLET1_R * 1.02, mode=Mode.PRIVATE)
    fillet1_2_piece_4 = fillet1_2_piece_4 - Plane(origin=(-1, 9.5, -24.5), x_dir=(0.7071067811865475, -0.7071067811865475, 0), z_dir=(0, 0, -1)) * Sphere(FILLET1_R, mode=Mode.PRIVATE)
    add(fillet1_2_piece_4, mode=Mode.SUBTRACT)
    with BuildSketch(Plane(origin=(28, 0, 0), x_dir=(-1, 0, 0), z_dir=(0, 1, 0)), Plane(origin=(-2, 9.5, 0), x_dir=(1, 0, 0), z_dir=(0, -1, 0)), Plane(origin=(28, 0, -25.5), x_dir=(0, 0, 1), z_dir=(0, 1, 0))) as fillet1_2_piece_5:
        with BuildLine():
            CenterArc((FILLET1_R, -FILLET1_R), FILLET1_R, 90, 90)
            Line((0, -FILLET1_R), (-FILLET1_R * 0.02, -FILLET1_R))
            Line((-FILLET1_R * 0.02, -FILLET1_R), (-FILLET1_R * 0.02, FILLET1_R * 0.02))
            Line((-FILLET1_R * 0.02, FILLET1_R * 0.02), (FILLET1_R, FILLET1_R * 0.02))
            Line((FILLET1_R, FILLET1_R * 0.02), (FILLET1_R, 0))
        make_face()
    extrude(amount=9.5, mode=Mode.SUBTRACT)
    with BuildSketch(Plane(origin=(27, 10.5, -25.5), x_dir=(0, 0, 1), z_dir=(-1, 0, 0)), Plane(origin=(27, 10.5, 0), x_dir=(0, -1, 0), z_dir=(-1, 0, 0))) as fillet1_2_piece_6:
        with BuildLine():
            CenterArc((FILLET1_R, -FILLET1_R), FILLET1_R, 90, 90)
            Line((0, -FILLET1_R), (-FILLET1_R * 0.02, -FILLET1_R))
            Line((-FILLET1_R * 0.02, -FILLET1_R), (-FILLET1_R * 0.02, FILLET1_R * 0.02))
            Line((-FILLET1_R * 0.02, FILLET1_R * 0.02), (FILLET1_R, FILLET1_R * 0.02))
            Line((FILLET1_R, FILLET1_R * 0.02), (FILLET1_R, 0))
        make_face()
    extrude(amount=28, mode=Mode.SUBTRACT)
    with BuildSketch(Plane(origin=(-2, 0, -25.5), x_dir=(0, 0, 1), z_dir=(0, 1, 0))) as fillet1_2_piece_7:
        with BuildLine():
            CenterArc((FILLET1_R, FILLET1_R), FILLET1_R, 180, 90)
            Line((0, FILLET1_R), (-FILLET1_R * 0.02, FILLET1_R))
            Line((-FILLET1_R * 0.02, FILLET1_R), (-FILLET1_R * 0.02, -FILLET1_R * 0.02))
            Line((-FILLET1_R * 0.02, -FILLET1_R * 0.02), (FILLET1_R, -FILLET1_R * 0.02))
            Line((FILLET1_R, -FILLET1_R * 0.02), (FILLET1_R, 0))
        make_face()
    extrude(amount=9.5, mode=Mode.SUBTRACT)
    with BuildSketch(Plane(origin=(-2, 10.5, -24.5), x_dir=(0, -1, 0), z_dir=(0, 0, 1))) as fillet1_2_piece_8:
        with BuildLine():
            CenterArc((FILLET1_R, FILLET1_R), FILLET1_R, 180, 90)
            Line((0, FILLET1_R), (-FILLET1_R * 0.02, FILLET1_R))
            Line((-FILLET1_R * 0.02, FILLET1_R), (-FILLET1_R * 0.02, -FILLET1_R * 0.02))
            Line((-FILLET1_R * 0.02, -FILLET1_R * 0.02), (FILLET1_R, -FILLET1_R * 0.02))
            Line((FILLET1_R, -FILLET1_R * 0.02), (FILLET1_R, 0))
        make_face()
    extrude(amount=23.5, mode=Mode.SUBTRACT)
    with BuildSketch(Plane(origin=(28, 10.5, -1), x_dir=(-1, 0, 0), z_dir=(0, 0, -1))) as fillet1_2_piece_9:
        with BuildLine():
            CenterArc((FILLET1_R, -FILLET1_R), FILLET1_R, 90, 90)
            Line((0, -FILLET1_R), (-FILLET1_R * 0.02, -FILLET1_R))
            Line((-FILLET1_R * 0.02, -FILLET1_R), (-FILLET1_R * 0.02, FILLET1_R * 0.02))
            Line((-FILLET1_R * 0.02, FILLET1_R * 0.02), (FILLET1_R, FILLET1_R * 0.02))
            Line((FILLET1_R, FILLET1_R * 0.02), (FILLET1_R, 0))
        make_face()
    extrude(amount=23.5, mode=Mode.SUBTRACT)


solid = part.part
